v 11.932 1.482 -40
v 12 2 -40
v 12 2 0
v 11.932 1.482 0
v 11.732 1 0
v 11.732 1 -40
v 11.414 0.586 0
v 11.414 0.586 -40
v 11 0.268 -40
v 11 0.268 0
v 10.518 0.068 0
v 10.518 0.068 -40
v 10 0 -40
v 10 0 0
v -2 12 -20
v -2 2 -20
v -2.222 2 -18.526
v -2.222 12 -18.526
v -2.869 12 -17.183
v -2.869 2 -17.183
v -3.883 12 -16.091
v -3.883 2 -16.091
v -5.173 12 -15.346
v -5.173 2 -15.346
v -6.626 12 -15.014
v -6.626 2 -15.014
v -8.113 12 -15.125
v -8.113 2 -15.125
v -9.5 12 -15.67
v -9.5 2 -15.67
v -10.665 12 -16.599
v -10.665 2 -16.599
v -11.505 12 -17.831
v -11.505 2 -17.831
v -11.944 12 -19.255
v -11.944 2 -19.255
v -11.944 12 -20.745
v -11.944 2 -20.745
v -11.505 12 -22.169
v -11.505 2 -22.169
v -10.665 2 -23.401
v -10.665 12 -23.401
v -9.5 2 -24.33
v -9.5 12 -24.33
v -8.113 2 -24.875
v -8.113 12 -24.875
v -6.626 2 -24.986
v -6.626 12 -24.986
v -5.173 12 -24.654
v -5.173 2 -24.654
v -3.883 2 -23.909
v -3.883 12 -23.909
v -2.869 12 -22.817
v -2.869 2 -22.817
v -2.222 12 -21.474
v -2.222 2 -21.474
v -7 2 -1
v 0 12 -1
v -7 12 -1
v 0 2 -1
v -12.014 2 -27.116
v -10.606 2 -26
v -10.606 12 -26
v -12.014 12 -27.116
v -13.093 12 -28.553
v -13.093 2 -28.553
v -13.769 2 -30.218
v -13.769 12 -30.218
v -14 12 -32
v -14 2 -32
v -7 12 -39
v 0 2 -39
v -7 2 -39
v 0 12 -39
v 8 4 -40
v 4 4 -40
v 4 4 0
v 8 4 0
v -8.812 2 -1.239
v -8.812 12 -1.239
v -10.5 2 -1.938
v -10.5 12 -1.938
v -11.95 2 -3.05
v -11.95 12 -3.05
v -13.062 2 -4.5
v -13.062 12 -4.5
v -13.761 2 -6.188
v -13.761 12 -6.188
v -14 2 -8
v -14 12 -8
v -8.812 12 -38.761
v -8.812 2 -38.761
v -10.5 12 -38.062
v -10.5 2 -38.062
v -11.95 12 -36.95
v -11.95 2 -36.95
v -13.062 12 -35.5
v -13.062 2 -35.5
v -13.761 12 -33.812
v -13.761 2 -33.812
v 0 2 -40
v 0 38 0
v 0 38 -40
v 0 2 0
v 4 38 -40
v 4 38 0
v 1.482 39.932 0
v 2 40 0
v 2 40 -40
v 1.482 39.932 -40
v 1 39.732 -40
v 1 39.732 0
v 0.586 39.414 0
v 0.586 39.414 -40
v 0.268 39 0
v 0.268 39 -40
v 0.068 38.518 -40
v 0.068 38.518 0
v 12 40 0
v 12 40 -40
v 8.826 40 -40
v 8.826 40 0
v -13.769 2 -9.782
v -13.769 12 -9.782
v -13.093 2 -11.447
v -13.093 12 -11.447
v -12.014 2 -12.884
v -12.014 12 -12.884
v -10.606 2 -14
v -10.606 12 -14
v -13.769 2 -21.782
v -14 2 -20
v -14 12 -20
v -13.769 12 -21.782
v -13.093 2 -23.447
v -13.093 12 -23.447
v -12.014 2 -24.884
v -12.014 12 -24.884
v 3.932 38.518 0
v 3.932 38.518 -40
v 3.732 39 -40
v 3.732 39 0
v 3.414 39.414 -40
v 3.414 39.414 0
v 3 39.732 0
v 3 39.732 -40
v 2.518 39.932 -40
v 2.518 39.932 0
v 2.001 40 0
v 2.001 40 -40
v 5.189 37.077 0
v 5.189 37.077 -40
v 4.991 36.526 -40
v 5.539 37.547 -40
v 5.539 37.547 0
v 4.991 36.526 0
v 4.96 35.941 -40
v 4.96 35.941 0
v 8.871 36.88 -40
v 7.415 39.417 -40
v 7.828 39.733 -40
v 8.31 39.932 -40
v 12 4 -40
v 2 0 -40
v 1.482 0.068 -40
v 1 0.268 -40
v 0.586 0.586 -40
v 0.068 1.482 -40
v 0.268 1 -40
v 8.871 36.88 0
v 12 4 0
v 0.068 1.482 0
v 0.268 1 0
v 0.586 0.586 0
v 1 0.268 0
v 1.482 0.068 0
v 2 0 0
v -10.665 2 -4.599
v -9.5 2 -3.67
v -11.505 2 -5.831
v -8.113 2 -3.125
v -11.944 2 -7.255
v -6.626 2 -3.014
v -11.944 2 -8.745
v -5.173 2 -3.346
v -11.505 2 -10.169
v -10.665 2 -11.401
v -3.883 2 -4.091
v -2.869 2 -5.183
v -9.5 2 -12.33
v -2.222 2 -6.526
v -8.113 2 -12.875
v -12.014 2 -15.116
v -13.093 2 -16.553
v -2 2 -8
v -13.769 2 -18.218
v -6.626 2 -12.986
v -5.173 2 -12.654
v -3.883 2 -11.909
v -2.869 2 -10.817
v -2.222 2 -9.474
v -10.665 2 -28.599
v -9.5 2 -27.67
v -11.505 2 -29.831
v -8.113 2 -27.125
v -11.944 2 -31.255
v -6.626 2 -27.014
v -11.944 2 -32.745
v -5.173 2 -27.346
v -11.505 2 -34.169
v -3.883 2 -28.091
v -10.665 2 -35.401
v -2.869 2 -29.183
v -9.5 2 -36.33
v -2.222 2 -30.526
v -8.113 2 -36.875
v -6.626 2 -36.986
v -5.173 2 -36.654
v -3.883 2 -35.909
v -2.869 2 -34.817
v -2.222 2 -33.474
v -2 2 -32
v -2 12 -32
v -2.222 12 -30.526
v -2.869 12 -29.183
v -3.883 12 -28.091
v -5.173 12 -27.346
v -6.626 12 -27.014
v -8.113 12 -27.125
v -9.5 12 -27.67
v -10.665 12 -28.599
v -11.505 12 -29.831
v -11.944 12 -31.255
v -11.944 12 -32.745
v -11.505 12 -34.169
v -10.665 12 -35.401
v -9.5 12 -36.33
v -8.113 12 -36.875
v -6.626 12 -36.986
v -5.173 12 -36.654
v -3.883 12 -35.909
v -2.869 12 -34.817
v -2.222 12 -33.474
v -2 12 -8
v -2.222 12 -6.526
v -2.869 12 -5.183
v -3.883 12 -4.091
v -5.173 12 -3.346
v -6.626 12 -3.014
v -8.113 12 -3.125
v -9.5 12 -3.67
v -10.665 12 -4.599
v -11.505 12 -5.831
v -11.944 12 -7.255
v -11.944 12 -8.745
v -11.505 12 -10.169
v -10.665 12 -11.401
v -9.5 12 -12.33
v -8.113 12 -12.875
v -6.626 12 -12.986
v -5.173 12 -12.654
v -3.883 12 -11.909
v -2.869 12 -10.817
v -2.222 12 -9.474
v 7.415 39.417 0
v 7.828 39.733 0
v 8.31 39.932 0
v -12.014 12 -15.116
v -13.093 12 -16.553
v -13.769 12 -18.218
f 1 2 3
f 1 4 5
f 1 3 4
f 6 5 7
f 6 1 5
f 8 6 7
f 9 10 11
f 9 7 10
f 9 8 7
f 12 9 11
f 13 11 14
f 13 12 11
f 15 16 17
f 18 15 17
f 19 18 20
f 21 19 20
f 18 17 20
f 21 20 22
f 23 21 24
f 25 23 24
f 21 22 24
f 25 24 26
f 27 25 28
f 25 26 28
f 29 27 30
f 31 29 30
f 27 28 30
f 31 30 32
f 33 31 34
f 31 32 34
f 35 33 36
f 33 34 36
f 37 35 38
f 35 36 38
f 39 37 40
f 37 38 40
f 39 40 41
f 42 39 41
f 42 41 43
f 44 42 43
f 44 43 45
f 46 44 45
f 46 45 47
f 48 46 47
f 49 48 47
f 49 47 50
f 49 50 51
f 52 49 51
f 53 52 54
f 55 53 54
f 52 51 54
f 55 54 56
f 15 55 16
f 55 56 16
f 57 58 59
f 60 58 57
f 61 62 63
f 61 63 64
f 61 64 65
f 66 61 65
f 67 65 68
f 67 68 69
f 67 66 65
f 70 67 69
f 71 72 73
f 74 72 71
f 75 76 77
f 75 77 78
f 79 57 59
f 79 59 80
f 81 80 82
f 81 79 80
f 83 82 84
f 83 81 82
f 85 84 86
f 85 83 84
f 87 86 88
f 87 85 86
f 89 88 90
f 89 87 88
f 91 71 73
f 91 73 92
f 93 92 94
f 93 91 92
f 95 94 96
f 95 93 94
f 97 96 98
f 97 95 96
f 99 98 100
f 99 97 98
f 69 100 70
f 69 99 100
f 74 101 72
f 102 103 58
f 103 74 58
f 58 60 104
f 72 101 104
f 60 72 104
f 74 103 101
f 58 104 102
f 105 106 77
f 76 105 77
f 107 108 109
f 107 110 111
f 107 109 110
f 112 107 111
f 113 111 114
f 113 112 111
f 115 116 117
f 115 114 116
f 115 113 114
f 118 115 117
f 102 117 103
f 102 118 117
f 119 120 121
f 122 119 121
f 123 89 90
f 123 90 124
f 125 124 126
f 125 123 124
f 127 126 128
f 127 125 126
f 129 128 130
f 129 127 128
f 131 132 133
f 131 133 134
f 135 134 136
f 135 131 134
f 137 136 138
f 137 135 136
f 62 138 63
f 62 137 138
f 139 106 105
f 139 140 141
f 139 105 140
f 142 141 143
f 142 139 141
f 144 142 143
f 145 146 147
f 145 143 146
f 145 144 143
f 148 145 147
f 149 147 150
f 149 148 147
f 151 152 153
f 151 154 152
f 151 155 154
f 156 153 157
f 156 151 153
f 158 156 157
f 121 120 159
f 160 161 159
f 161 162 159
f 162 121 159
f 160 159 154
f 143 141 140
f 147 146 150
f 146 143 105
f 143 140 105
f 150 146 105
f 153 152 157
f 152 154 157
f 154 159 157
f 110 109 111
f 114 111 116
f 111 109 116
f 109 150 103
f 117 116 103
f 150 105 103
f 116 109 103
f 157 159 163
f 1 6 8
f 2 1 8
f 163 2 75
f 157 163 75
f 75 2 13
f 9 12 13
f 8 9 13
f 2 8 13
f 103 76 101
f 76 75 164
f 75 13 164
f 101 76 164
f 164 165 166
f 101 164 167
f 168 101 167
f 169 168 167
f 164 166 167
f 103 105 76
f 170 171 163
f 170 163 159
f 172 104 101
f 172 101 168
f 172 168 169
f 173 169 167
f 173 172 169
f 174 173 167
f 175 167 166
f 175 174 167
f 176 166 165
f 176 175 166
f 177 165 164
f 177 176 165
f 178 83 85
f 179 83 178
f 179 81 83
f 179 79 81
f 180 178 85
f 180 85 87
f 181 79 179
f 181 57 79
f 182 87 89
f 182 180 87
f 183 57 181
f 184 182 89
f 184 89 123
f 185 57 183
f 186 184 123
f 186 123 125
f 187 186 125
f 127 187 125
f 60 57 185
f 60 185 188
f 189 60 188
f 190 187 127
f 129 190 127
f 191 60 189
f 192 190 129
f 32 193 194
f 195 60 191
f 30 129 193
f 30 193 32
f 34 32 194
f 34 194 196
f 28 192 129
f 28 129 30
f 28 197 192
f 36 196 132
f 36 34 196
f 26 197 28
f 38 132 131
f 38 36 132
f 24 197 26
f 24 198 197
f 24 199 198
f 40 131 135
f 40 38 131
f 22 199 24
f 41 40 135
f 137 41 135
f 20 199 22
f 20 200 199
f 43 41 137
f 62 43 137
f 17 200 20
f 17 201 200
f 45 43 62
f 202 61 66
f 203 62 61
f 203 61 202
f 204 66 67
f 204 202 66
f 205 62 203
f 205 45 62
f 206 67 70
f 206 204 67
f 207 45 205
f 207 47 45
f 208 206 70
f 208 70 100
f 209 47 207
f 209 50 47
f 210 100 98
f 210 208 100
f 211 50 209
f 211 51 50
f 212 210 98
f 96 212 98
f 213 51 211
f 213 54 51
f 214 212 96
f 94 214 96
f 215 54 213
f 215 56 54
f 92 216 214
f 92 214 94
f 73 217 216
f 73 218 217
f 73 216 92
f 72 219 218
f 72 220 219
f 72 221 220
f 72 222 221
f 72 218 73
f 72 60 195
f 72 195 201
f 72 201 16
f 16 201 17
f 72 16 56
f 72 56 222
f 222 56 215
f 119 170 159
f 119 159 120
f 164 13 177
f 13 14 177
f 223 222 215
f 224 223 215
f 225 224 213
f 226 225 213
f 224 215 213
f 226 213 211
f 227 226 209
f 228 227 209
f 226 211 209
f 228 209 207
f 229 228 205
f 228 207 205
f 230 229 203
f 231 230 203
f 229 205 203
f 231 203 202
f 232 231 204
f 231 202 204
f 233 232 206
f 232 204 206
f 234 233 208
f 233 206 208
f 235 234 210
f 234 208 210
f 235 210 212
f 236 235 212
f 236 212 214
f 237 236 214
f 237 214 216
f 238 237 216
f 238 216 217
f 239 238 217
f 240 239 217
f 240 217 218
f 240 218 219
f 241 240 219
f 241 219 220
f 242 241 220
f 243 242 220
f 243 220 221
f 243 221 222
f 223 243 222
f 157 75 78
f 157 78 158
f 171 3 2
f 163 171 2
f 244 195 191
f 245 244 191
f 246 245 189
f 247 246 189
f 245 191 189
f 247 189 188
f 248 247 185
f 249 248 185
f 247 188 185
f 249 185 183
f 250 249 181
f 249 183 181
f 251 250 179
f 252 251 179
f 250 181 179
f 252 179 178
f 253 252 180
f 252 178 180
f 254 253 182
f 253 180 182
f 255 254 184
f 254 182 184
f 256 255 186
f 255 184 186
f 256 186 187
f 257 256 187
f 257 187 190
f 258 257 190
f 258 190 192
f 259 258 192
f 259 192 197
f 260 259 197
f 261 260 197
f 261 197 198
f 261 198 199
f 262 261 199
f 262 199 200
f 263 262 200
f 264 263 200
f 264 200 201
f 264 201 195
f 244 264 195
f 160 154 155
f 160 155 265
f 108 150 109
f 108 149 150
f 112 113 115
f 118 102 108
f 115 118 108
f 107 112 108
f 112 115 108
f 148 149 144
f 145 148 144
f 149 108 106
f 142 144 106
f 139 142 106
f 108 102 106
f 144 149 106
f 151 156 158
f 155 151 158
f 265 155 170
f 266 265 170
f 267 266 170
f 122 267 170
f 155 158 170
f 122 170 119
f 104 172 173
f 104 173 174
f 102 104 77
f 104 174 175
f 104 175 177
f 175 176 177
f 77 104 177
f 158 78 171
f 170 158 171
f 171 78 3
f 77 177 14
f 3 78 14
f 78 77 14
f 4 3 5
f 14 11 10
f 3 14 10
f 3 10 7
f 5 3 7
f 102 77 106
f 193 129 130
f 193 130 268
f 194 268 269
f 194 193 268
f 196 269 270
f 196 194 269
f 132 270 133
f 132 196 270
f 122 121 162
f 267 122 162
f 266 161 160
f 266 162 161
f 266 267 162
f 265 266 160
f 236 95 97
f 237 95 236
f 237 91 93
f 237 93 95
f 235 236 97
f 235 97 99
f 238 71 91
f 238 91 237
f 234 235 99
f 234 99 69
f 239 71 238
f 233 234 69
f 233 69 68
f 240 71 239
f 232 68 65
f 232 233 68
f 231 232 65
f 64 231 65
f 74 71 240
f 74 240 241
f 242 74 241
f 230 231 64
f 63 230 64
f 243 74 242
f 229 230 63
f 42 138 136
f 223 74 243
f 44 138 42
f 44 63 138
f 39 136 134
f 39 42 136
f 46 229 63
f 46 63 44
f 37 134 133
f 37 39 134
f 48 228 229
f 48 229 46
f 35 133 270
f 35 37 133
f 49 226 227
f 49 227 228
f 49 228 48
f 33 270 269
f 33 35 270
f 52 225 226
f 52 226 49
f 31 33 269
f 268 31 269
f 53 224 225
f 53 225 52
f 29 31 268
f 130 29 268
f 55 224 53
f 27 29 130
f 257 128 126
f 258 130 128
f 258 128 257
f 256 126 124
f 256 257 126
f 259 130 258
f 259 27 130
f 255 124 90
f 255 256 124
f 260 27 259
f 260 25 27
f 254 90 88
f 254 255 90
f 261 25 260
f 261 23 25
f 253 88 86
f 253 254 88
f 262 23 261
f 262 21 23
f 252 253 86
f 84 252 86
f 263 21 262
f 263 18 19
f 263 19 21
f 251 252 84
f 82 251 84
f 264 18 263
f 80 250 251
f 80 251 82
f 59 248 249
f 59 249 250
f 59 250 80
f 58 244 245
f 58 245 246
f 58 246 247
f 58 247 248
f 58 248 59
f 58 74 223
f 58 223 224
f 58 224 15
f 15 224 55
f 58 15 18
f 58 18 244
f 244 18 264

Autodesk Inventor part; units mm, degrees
ref_plane "YZ Plane" through (0, 0, 0) normal (1, 0, 0) x (0, 1, 0)
ref_plane "XZ Plane" through (0, 0, 0) normal (0, 1, 0) x (-1, 0, 0)
ref_plane "XY Plane" through (0, 0, 0) normal (0, 0, 1) x (1, 0, 0)
sketch "Sketch1" plane through (0, 0, 0) normal (0, 1, 0) x (-1, 0, 0)
  line L0 (0, 0) -> (-12, 0)
  line L1 (-12, 0) -> (-12, -40)
  line L2 (-12, -40) -> (0, -40)
  line L3 (0, -40) -> (0, 0)
  point P0 (-6, 0)
  dimension "d0" = 40
  dimension "d1" = 12
extrude "Extrusion1" add sketch "Sketch1" along normal blind 40
sketch "Sketch2" plane through (12, 0, -40) normal (0, 0, -1) x (-1, 0, 0)
  line L0 (0, 40) -> (12, 40) projected
  line L1 (8, 40) -> (8, 4)
  line L2 (8, 4) -> (4, 4)
  line L3 (4, 4) -> (7.129, 36.8805)
  line L4 (7.129, 36.8805) -> (4, 40)
  line L5 (4, 40) -> (8, 40)
  line L6 (12, 0) -> (12, 40) projected
  line L7 (0, 0) -> (0, 40) projected
  line L8 (0, 0) -> (12, 0) projected
  line L9 (0, 4) -> (3.129, 36.8805)
  line L10 (3.129, 36.8805) -> (0, 40)
  point P0 (6, 0)
  point P1 (6, 4)
  dimension "d4" = 4
  dimension "d5" = 4
  dimension "d6" = 4
  dimension "d7" = 4
  dimension "d8" = 4
  dimension "d9" = 4
  dimension "d10" = 3.982
  dimension "d11" = 2.8241
extrude "Extrusion2" cut sketch "Sketch2" against normal blind 40 contours L10 L9 L7 | L0 L1 L2 L3 L4
fillet "Fillet1" radius 2 6 edges at (12, 0, -20) (0, 0, -20) (0, 40, -20) (4, 40, -20) (8, 40, -20) (4.871, 36.8805, -20)
sketch "Sketch3" plane through (0, 2, -40) normal (-1, 0, 0) x (0, 0, 1)
  line L0 (40, 0) -> (0, 0) projected
  line L1 (39, 0) -> (1, 0)
  line L2 (1, 0) -> (1, 10)
  line L3 (1, 10) -> (39, 10)
  line L4 (39, 10) -> (39, 0)
  line L5 (0, 0) -> (0, 36) projected
  point P0 (40, -2)
  point P1 (1, 0)
  dimension "d15" = 38
  dimension "d16" = 1
  dimension "d17" = 10
extrude "Extrusion3" add sketch "Sketch3" along normal blind 14
sketch "Sketch4" plane through (-14, 2, -1) normal (0, -1, 0) x (1, 0, 0)
  circle A0 centre (7, -7) radius 5
  circle A1 centre (7, -31) radius 5
  circle A2 centre (7, -19) radius 5
  line L0 (14, -38) -> (0, -38) projected
  line L1 (0, -38) -> (0, 0) projected
  point P0 (14, 1)
  point P1 (0, -19)
  dimension "d20" = 10
  dimension "d21" = 10
  dimension "d22" = 10
  dimension "d23" = 2
  dimension "d24" = 2
  dimension "d25" = 2
  dimension "d26" = 7
  dimension "d27" = 7
  dimension "d28" = 7
extrude "Extrusion4" cut sketch "Sketch4" against normal blind 14
fillet "Fillet2" radius 7 1 edges at (-14, 7, -39)
fillet "Fillet3" radius 7 1 edges at (-14, 7, -1)
sketch "Sketch5" plane through (0, 2, -39) normal (0, -1, 0) x (1, 0, 0)
  circle A0 centre (-7, 19) radius 5 projected
  arc A1 (-14, 7) -> (-7, 0) centre (-7, 7) ccw projected
  arc A2 (-10.6056, 13) -> (-14, 7) centre (-7, 7) ccw
  line L0 (-14, 7) -> (-14, 31) projected
  circle A3 centre (-7, 7) radius 5 projected
  arc A4 (-14, 19) -> (-10.6056, 13) centre (-7, 19) ccw
  circle A5 centre (-7, 31) radius 5 projected
  arc A6 (-10.6056, 25) -> (-14, 19) centre (-7, 19) ccw
  arc A7 (-7, 38) -> (-14, 31) centre (-7, 31) ccw projected
  arc A8 (-14, 31) -> (-10.6056, 25) centre (-7, 31) ccw
  line L1 (-14, 31) -> (-14, 7)
  point P0 (0, 39)
  dimension "d33" = 7
  dimension "d34" = 7
extrude "Extrusion5" cut sketch "Sketch5" against normal blind 14 contours L0 A8 A6 | A2 L0 A4
properties part number "theWritersHolster"
